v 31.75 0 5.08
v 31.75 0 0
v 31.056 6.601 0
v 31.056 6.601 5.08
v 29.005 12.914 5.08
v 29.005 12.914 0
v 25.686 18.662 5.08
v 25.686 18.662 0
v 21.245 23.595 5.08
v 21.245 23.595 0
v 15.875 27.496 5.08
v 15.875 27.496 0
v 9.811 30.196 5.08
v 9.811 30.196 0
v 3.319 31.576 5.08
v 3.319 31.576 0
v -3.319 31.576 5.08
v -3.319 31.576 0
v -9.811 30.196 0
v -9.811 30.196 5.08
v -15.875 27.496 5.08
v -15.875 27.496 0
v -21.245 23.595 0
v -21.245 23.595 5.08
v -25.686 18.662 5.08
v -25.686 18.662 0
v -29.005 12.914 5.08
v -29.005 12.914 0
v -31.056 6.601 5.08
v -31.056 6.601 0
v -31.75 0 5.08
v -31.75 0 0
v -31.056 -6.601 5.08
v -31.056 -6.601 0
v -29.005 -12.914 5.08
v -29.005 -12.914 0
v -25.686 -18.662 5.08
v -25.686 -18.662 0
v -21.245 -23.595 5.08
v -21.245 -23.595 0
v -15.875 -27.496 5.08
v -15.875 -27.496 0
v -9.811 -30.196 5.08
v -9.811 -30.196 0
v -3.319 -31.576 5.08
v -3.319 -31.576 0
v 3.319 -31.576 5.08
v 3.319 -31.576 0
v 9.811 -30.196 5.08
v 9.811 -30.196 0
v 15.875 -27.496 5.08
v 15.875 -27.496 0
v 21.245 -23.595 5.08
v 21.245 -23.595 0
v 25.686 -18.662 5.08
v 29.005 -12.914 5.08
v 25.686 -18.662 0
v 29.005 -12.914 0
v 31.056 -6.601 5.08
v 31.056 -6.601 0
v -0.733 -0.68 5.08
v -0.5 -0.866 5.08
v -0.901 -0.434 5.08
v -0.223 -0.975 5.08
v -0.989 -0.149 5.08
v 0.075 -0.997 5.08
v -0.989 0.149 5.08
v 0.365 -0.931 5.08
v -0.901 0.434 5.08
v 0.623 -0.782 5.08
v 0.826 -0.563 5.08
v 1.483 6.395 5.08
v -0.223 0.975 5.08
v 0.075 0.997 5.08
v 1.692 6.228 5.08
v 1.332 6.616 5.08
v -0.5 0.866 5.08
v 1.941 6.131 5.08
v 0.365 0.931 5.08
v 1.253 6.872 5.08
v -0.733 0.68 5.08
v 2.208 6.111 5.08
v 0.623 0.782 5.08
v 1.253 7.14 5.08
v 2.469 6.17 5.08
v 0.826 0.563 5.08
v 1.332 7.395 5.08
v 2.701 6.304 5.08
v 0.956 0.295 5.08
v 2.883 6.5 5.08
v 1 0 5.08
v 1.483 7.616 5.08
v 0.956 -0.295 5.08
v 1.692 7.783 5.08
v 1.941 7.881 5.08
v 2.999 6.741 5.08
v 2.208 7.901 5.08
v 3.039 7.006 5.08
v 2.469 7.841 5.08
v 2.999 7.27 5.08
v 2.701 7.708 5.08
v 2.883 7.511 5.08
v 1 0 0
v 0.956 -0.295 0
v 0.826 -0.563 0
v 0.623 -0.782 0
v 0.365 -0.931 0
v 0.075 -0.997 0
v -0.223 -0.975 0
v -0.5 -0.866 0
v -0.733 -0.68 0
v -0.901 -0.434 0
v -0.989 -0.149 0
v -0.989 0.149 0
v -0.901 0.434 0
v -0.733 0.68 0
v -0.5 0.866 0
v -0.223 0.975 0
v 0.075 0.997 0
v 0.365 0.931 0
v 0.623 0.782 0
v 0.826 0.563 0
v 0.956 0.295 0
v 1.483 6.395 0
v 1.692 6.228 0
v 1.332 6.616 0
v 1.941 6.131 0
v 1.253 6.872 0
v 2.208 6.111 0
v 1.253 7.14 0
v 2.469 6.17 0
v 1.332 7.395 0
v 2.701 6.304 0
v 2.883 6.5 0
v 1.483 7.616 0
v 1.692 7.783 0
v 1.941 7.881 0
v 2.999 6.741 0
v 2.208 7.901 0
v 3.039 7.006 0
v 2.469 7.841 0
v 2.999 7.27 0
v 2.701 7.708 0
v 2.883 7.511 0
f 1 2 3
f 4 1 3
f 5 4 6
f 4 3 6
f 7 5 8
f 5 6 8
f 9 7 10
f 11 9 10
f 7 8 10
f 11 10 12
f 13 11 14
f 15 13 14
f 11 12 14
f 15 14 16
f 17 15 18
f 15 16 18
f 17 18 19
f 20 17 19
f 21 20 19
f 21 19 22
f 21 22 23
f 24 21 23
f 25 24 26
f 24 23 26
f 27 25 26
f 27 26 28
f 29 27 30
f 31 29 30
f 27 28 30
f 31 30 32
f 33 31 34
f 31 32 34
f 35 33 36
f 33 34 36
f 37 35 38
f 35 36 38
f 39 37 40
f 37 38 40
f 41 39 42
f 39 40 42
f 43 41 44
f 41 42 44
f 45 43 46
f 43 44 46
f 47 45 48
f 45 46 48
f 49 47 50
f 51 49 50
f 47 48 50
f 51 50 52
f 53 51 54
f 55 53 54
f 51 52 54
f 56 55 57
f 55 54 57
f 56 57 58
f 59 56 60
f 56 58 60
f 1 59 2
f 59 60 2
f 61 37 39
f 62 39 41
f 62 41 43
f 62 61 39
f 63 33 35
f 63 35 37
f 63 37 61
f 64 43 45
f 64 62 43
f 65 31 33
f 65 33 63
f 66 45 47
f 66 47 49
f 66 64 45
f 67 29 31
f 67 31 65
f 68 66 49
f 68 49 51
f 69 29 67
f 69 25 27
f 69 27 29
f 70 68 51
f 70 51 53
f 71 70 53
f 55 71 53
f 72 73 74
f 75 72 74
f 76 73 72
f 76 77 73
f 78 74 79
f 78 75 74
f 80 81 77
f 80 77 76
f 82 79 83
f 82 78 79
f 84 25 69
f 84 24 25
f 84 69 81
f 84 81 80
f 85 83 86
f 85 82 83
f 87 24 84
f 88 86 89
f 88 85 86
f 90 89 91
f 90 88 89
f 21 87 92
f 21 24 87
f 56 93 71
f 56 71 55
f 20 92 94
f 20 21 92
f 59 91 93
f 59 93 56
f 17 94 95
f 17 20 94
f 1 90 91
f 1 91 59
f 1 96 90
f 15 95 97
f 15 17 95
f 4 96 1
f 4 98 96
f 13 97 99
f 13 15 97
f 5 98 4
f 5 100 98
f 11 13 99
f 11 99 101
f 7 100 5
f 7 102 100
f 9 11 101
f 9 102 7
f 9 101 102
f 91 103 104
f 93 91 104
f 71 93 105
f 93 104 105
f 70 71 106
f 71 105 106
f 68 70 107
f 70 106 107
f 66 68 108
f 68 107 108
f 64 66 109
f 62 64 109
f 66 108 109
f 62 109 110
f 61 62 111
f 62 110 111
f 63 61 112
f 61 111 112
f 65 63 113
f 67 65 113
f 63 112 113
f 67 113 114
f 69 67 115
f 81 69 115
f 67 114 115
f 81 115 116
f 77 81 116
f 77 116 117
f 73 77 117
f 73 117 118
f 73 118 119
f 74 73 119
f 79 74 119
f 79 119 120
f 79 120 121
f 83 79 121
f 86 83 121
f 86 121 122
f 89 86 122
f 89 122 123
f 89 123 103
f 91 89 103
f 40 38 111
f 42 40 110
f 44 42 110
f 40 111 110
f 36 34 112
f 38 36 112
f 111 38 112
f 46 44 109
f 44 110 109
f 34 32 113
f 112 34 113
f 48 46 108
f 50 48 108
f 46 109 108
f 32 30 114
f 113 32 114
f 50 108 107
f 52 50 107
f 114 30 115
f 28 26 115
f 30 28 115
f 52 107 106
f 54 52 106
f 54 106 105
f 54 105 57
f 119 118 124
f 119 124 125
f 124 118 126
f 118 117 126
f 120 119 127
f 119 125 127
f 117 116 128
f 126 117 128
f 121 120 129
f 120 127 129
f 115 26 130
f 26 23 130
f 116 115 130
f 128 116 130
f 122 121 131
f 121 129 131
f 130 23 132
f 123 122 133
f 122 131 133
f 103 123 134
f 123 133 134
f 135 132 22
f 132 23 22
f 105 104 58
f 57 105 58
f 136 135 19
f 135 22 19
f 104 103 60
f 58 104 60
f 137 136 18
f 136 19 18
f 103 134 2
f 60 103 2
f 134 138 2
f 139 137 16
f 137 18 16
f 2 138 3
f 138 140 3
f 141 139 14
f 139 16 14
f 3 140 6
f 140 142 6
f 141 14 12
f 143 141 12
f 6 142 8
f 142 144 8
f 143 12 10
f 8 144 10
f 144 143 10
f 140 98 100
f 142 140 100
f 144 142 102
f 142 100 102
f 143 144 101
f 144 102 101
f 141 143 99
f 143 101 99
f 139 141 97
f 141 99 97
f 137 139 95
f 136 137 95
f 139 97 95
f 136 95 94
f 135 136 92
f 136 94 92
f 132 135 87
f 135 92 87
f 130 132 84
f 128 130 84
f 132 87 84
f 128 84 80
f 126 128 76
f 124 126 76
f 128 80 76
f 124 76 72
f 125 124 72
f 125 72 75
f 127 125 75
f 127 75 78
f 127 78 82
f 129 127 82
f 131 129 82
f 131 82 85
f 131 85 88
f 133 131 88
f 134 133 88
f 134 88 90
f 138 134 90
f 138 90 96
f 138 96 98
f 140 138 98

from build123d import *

# Parameters (mm, degrees)
F0_R     = 31.75
F1_DEPTH = 5.08
F2_R     = 1
F3_DEPTH = 5.081
F4_R     = 0.897754
F5_DEPTH = 5.081


with BuildPart() as f1:
    # F0 (on Top) → F1 (new body)
    with BuildSketch(Plane.XY):
        Circle(F0_R)
    extrude(amount=F1_DEPTH)

    # F2 (on face) → F3 (cut, through all)
    with BuildSketch(Plane(origin=(0, 0, 0), x_dir=(1, 0, 0), z_dir=(0, 0, -1))):
        Circle(F2_R)
    extrude(amount=-F3_DEPTH, mode=Mode.SUBTRACT)

    # F4 (on face) → F5 (cut, through all)
    with BuildSketch(Plane.XY.offset(5.08)):
        with Locations((2.140864, 7.005748)):
            Circle(F4_R)
    extrude(amount=-F5_DEPTH, mode=Mode.SUBTRACT)


solid = f1.part
